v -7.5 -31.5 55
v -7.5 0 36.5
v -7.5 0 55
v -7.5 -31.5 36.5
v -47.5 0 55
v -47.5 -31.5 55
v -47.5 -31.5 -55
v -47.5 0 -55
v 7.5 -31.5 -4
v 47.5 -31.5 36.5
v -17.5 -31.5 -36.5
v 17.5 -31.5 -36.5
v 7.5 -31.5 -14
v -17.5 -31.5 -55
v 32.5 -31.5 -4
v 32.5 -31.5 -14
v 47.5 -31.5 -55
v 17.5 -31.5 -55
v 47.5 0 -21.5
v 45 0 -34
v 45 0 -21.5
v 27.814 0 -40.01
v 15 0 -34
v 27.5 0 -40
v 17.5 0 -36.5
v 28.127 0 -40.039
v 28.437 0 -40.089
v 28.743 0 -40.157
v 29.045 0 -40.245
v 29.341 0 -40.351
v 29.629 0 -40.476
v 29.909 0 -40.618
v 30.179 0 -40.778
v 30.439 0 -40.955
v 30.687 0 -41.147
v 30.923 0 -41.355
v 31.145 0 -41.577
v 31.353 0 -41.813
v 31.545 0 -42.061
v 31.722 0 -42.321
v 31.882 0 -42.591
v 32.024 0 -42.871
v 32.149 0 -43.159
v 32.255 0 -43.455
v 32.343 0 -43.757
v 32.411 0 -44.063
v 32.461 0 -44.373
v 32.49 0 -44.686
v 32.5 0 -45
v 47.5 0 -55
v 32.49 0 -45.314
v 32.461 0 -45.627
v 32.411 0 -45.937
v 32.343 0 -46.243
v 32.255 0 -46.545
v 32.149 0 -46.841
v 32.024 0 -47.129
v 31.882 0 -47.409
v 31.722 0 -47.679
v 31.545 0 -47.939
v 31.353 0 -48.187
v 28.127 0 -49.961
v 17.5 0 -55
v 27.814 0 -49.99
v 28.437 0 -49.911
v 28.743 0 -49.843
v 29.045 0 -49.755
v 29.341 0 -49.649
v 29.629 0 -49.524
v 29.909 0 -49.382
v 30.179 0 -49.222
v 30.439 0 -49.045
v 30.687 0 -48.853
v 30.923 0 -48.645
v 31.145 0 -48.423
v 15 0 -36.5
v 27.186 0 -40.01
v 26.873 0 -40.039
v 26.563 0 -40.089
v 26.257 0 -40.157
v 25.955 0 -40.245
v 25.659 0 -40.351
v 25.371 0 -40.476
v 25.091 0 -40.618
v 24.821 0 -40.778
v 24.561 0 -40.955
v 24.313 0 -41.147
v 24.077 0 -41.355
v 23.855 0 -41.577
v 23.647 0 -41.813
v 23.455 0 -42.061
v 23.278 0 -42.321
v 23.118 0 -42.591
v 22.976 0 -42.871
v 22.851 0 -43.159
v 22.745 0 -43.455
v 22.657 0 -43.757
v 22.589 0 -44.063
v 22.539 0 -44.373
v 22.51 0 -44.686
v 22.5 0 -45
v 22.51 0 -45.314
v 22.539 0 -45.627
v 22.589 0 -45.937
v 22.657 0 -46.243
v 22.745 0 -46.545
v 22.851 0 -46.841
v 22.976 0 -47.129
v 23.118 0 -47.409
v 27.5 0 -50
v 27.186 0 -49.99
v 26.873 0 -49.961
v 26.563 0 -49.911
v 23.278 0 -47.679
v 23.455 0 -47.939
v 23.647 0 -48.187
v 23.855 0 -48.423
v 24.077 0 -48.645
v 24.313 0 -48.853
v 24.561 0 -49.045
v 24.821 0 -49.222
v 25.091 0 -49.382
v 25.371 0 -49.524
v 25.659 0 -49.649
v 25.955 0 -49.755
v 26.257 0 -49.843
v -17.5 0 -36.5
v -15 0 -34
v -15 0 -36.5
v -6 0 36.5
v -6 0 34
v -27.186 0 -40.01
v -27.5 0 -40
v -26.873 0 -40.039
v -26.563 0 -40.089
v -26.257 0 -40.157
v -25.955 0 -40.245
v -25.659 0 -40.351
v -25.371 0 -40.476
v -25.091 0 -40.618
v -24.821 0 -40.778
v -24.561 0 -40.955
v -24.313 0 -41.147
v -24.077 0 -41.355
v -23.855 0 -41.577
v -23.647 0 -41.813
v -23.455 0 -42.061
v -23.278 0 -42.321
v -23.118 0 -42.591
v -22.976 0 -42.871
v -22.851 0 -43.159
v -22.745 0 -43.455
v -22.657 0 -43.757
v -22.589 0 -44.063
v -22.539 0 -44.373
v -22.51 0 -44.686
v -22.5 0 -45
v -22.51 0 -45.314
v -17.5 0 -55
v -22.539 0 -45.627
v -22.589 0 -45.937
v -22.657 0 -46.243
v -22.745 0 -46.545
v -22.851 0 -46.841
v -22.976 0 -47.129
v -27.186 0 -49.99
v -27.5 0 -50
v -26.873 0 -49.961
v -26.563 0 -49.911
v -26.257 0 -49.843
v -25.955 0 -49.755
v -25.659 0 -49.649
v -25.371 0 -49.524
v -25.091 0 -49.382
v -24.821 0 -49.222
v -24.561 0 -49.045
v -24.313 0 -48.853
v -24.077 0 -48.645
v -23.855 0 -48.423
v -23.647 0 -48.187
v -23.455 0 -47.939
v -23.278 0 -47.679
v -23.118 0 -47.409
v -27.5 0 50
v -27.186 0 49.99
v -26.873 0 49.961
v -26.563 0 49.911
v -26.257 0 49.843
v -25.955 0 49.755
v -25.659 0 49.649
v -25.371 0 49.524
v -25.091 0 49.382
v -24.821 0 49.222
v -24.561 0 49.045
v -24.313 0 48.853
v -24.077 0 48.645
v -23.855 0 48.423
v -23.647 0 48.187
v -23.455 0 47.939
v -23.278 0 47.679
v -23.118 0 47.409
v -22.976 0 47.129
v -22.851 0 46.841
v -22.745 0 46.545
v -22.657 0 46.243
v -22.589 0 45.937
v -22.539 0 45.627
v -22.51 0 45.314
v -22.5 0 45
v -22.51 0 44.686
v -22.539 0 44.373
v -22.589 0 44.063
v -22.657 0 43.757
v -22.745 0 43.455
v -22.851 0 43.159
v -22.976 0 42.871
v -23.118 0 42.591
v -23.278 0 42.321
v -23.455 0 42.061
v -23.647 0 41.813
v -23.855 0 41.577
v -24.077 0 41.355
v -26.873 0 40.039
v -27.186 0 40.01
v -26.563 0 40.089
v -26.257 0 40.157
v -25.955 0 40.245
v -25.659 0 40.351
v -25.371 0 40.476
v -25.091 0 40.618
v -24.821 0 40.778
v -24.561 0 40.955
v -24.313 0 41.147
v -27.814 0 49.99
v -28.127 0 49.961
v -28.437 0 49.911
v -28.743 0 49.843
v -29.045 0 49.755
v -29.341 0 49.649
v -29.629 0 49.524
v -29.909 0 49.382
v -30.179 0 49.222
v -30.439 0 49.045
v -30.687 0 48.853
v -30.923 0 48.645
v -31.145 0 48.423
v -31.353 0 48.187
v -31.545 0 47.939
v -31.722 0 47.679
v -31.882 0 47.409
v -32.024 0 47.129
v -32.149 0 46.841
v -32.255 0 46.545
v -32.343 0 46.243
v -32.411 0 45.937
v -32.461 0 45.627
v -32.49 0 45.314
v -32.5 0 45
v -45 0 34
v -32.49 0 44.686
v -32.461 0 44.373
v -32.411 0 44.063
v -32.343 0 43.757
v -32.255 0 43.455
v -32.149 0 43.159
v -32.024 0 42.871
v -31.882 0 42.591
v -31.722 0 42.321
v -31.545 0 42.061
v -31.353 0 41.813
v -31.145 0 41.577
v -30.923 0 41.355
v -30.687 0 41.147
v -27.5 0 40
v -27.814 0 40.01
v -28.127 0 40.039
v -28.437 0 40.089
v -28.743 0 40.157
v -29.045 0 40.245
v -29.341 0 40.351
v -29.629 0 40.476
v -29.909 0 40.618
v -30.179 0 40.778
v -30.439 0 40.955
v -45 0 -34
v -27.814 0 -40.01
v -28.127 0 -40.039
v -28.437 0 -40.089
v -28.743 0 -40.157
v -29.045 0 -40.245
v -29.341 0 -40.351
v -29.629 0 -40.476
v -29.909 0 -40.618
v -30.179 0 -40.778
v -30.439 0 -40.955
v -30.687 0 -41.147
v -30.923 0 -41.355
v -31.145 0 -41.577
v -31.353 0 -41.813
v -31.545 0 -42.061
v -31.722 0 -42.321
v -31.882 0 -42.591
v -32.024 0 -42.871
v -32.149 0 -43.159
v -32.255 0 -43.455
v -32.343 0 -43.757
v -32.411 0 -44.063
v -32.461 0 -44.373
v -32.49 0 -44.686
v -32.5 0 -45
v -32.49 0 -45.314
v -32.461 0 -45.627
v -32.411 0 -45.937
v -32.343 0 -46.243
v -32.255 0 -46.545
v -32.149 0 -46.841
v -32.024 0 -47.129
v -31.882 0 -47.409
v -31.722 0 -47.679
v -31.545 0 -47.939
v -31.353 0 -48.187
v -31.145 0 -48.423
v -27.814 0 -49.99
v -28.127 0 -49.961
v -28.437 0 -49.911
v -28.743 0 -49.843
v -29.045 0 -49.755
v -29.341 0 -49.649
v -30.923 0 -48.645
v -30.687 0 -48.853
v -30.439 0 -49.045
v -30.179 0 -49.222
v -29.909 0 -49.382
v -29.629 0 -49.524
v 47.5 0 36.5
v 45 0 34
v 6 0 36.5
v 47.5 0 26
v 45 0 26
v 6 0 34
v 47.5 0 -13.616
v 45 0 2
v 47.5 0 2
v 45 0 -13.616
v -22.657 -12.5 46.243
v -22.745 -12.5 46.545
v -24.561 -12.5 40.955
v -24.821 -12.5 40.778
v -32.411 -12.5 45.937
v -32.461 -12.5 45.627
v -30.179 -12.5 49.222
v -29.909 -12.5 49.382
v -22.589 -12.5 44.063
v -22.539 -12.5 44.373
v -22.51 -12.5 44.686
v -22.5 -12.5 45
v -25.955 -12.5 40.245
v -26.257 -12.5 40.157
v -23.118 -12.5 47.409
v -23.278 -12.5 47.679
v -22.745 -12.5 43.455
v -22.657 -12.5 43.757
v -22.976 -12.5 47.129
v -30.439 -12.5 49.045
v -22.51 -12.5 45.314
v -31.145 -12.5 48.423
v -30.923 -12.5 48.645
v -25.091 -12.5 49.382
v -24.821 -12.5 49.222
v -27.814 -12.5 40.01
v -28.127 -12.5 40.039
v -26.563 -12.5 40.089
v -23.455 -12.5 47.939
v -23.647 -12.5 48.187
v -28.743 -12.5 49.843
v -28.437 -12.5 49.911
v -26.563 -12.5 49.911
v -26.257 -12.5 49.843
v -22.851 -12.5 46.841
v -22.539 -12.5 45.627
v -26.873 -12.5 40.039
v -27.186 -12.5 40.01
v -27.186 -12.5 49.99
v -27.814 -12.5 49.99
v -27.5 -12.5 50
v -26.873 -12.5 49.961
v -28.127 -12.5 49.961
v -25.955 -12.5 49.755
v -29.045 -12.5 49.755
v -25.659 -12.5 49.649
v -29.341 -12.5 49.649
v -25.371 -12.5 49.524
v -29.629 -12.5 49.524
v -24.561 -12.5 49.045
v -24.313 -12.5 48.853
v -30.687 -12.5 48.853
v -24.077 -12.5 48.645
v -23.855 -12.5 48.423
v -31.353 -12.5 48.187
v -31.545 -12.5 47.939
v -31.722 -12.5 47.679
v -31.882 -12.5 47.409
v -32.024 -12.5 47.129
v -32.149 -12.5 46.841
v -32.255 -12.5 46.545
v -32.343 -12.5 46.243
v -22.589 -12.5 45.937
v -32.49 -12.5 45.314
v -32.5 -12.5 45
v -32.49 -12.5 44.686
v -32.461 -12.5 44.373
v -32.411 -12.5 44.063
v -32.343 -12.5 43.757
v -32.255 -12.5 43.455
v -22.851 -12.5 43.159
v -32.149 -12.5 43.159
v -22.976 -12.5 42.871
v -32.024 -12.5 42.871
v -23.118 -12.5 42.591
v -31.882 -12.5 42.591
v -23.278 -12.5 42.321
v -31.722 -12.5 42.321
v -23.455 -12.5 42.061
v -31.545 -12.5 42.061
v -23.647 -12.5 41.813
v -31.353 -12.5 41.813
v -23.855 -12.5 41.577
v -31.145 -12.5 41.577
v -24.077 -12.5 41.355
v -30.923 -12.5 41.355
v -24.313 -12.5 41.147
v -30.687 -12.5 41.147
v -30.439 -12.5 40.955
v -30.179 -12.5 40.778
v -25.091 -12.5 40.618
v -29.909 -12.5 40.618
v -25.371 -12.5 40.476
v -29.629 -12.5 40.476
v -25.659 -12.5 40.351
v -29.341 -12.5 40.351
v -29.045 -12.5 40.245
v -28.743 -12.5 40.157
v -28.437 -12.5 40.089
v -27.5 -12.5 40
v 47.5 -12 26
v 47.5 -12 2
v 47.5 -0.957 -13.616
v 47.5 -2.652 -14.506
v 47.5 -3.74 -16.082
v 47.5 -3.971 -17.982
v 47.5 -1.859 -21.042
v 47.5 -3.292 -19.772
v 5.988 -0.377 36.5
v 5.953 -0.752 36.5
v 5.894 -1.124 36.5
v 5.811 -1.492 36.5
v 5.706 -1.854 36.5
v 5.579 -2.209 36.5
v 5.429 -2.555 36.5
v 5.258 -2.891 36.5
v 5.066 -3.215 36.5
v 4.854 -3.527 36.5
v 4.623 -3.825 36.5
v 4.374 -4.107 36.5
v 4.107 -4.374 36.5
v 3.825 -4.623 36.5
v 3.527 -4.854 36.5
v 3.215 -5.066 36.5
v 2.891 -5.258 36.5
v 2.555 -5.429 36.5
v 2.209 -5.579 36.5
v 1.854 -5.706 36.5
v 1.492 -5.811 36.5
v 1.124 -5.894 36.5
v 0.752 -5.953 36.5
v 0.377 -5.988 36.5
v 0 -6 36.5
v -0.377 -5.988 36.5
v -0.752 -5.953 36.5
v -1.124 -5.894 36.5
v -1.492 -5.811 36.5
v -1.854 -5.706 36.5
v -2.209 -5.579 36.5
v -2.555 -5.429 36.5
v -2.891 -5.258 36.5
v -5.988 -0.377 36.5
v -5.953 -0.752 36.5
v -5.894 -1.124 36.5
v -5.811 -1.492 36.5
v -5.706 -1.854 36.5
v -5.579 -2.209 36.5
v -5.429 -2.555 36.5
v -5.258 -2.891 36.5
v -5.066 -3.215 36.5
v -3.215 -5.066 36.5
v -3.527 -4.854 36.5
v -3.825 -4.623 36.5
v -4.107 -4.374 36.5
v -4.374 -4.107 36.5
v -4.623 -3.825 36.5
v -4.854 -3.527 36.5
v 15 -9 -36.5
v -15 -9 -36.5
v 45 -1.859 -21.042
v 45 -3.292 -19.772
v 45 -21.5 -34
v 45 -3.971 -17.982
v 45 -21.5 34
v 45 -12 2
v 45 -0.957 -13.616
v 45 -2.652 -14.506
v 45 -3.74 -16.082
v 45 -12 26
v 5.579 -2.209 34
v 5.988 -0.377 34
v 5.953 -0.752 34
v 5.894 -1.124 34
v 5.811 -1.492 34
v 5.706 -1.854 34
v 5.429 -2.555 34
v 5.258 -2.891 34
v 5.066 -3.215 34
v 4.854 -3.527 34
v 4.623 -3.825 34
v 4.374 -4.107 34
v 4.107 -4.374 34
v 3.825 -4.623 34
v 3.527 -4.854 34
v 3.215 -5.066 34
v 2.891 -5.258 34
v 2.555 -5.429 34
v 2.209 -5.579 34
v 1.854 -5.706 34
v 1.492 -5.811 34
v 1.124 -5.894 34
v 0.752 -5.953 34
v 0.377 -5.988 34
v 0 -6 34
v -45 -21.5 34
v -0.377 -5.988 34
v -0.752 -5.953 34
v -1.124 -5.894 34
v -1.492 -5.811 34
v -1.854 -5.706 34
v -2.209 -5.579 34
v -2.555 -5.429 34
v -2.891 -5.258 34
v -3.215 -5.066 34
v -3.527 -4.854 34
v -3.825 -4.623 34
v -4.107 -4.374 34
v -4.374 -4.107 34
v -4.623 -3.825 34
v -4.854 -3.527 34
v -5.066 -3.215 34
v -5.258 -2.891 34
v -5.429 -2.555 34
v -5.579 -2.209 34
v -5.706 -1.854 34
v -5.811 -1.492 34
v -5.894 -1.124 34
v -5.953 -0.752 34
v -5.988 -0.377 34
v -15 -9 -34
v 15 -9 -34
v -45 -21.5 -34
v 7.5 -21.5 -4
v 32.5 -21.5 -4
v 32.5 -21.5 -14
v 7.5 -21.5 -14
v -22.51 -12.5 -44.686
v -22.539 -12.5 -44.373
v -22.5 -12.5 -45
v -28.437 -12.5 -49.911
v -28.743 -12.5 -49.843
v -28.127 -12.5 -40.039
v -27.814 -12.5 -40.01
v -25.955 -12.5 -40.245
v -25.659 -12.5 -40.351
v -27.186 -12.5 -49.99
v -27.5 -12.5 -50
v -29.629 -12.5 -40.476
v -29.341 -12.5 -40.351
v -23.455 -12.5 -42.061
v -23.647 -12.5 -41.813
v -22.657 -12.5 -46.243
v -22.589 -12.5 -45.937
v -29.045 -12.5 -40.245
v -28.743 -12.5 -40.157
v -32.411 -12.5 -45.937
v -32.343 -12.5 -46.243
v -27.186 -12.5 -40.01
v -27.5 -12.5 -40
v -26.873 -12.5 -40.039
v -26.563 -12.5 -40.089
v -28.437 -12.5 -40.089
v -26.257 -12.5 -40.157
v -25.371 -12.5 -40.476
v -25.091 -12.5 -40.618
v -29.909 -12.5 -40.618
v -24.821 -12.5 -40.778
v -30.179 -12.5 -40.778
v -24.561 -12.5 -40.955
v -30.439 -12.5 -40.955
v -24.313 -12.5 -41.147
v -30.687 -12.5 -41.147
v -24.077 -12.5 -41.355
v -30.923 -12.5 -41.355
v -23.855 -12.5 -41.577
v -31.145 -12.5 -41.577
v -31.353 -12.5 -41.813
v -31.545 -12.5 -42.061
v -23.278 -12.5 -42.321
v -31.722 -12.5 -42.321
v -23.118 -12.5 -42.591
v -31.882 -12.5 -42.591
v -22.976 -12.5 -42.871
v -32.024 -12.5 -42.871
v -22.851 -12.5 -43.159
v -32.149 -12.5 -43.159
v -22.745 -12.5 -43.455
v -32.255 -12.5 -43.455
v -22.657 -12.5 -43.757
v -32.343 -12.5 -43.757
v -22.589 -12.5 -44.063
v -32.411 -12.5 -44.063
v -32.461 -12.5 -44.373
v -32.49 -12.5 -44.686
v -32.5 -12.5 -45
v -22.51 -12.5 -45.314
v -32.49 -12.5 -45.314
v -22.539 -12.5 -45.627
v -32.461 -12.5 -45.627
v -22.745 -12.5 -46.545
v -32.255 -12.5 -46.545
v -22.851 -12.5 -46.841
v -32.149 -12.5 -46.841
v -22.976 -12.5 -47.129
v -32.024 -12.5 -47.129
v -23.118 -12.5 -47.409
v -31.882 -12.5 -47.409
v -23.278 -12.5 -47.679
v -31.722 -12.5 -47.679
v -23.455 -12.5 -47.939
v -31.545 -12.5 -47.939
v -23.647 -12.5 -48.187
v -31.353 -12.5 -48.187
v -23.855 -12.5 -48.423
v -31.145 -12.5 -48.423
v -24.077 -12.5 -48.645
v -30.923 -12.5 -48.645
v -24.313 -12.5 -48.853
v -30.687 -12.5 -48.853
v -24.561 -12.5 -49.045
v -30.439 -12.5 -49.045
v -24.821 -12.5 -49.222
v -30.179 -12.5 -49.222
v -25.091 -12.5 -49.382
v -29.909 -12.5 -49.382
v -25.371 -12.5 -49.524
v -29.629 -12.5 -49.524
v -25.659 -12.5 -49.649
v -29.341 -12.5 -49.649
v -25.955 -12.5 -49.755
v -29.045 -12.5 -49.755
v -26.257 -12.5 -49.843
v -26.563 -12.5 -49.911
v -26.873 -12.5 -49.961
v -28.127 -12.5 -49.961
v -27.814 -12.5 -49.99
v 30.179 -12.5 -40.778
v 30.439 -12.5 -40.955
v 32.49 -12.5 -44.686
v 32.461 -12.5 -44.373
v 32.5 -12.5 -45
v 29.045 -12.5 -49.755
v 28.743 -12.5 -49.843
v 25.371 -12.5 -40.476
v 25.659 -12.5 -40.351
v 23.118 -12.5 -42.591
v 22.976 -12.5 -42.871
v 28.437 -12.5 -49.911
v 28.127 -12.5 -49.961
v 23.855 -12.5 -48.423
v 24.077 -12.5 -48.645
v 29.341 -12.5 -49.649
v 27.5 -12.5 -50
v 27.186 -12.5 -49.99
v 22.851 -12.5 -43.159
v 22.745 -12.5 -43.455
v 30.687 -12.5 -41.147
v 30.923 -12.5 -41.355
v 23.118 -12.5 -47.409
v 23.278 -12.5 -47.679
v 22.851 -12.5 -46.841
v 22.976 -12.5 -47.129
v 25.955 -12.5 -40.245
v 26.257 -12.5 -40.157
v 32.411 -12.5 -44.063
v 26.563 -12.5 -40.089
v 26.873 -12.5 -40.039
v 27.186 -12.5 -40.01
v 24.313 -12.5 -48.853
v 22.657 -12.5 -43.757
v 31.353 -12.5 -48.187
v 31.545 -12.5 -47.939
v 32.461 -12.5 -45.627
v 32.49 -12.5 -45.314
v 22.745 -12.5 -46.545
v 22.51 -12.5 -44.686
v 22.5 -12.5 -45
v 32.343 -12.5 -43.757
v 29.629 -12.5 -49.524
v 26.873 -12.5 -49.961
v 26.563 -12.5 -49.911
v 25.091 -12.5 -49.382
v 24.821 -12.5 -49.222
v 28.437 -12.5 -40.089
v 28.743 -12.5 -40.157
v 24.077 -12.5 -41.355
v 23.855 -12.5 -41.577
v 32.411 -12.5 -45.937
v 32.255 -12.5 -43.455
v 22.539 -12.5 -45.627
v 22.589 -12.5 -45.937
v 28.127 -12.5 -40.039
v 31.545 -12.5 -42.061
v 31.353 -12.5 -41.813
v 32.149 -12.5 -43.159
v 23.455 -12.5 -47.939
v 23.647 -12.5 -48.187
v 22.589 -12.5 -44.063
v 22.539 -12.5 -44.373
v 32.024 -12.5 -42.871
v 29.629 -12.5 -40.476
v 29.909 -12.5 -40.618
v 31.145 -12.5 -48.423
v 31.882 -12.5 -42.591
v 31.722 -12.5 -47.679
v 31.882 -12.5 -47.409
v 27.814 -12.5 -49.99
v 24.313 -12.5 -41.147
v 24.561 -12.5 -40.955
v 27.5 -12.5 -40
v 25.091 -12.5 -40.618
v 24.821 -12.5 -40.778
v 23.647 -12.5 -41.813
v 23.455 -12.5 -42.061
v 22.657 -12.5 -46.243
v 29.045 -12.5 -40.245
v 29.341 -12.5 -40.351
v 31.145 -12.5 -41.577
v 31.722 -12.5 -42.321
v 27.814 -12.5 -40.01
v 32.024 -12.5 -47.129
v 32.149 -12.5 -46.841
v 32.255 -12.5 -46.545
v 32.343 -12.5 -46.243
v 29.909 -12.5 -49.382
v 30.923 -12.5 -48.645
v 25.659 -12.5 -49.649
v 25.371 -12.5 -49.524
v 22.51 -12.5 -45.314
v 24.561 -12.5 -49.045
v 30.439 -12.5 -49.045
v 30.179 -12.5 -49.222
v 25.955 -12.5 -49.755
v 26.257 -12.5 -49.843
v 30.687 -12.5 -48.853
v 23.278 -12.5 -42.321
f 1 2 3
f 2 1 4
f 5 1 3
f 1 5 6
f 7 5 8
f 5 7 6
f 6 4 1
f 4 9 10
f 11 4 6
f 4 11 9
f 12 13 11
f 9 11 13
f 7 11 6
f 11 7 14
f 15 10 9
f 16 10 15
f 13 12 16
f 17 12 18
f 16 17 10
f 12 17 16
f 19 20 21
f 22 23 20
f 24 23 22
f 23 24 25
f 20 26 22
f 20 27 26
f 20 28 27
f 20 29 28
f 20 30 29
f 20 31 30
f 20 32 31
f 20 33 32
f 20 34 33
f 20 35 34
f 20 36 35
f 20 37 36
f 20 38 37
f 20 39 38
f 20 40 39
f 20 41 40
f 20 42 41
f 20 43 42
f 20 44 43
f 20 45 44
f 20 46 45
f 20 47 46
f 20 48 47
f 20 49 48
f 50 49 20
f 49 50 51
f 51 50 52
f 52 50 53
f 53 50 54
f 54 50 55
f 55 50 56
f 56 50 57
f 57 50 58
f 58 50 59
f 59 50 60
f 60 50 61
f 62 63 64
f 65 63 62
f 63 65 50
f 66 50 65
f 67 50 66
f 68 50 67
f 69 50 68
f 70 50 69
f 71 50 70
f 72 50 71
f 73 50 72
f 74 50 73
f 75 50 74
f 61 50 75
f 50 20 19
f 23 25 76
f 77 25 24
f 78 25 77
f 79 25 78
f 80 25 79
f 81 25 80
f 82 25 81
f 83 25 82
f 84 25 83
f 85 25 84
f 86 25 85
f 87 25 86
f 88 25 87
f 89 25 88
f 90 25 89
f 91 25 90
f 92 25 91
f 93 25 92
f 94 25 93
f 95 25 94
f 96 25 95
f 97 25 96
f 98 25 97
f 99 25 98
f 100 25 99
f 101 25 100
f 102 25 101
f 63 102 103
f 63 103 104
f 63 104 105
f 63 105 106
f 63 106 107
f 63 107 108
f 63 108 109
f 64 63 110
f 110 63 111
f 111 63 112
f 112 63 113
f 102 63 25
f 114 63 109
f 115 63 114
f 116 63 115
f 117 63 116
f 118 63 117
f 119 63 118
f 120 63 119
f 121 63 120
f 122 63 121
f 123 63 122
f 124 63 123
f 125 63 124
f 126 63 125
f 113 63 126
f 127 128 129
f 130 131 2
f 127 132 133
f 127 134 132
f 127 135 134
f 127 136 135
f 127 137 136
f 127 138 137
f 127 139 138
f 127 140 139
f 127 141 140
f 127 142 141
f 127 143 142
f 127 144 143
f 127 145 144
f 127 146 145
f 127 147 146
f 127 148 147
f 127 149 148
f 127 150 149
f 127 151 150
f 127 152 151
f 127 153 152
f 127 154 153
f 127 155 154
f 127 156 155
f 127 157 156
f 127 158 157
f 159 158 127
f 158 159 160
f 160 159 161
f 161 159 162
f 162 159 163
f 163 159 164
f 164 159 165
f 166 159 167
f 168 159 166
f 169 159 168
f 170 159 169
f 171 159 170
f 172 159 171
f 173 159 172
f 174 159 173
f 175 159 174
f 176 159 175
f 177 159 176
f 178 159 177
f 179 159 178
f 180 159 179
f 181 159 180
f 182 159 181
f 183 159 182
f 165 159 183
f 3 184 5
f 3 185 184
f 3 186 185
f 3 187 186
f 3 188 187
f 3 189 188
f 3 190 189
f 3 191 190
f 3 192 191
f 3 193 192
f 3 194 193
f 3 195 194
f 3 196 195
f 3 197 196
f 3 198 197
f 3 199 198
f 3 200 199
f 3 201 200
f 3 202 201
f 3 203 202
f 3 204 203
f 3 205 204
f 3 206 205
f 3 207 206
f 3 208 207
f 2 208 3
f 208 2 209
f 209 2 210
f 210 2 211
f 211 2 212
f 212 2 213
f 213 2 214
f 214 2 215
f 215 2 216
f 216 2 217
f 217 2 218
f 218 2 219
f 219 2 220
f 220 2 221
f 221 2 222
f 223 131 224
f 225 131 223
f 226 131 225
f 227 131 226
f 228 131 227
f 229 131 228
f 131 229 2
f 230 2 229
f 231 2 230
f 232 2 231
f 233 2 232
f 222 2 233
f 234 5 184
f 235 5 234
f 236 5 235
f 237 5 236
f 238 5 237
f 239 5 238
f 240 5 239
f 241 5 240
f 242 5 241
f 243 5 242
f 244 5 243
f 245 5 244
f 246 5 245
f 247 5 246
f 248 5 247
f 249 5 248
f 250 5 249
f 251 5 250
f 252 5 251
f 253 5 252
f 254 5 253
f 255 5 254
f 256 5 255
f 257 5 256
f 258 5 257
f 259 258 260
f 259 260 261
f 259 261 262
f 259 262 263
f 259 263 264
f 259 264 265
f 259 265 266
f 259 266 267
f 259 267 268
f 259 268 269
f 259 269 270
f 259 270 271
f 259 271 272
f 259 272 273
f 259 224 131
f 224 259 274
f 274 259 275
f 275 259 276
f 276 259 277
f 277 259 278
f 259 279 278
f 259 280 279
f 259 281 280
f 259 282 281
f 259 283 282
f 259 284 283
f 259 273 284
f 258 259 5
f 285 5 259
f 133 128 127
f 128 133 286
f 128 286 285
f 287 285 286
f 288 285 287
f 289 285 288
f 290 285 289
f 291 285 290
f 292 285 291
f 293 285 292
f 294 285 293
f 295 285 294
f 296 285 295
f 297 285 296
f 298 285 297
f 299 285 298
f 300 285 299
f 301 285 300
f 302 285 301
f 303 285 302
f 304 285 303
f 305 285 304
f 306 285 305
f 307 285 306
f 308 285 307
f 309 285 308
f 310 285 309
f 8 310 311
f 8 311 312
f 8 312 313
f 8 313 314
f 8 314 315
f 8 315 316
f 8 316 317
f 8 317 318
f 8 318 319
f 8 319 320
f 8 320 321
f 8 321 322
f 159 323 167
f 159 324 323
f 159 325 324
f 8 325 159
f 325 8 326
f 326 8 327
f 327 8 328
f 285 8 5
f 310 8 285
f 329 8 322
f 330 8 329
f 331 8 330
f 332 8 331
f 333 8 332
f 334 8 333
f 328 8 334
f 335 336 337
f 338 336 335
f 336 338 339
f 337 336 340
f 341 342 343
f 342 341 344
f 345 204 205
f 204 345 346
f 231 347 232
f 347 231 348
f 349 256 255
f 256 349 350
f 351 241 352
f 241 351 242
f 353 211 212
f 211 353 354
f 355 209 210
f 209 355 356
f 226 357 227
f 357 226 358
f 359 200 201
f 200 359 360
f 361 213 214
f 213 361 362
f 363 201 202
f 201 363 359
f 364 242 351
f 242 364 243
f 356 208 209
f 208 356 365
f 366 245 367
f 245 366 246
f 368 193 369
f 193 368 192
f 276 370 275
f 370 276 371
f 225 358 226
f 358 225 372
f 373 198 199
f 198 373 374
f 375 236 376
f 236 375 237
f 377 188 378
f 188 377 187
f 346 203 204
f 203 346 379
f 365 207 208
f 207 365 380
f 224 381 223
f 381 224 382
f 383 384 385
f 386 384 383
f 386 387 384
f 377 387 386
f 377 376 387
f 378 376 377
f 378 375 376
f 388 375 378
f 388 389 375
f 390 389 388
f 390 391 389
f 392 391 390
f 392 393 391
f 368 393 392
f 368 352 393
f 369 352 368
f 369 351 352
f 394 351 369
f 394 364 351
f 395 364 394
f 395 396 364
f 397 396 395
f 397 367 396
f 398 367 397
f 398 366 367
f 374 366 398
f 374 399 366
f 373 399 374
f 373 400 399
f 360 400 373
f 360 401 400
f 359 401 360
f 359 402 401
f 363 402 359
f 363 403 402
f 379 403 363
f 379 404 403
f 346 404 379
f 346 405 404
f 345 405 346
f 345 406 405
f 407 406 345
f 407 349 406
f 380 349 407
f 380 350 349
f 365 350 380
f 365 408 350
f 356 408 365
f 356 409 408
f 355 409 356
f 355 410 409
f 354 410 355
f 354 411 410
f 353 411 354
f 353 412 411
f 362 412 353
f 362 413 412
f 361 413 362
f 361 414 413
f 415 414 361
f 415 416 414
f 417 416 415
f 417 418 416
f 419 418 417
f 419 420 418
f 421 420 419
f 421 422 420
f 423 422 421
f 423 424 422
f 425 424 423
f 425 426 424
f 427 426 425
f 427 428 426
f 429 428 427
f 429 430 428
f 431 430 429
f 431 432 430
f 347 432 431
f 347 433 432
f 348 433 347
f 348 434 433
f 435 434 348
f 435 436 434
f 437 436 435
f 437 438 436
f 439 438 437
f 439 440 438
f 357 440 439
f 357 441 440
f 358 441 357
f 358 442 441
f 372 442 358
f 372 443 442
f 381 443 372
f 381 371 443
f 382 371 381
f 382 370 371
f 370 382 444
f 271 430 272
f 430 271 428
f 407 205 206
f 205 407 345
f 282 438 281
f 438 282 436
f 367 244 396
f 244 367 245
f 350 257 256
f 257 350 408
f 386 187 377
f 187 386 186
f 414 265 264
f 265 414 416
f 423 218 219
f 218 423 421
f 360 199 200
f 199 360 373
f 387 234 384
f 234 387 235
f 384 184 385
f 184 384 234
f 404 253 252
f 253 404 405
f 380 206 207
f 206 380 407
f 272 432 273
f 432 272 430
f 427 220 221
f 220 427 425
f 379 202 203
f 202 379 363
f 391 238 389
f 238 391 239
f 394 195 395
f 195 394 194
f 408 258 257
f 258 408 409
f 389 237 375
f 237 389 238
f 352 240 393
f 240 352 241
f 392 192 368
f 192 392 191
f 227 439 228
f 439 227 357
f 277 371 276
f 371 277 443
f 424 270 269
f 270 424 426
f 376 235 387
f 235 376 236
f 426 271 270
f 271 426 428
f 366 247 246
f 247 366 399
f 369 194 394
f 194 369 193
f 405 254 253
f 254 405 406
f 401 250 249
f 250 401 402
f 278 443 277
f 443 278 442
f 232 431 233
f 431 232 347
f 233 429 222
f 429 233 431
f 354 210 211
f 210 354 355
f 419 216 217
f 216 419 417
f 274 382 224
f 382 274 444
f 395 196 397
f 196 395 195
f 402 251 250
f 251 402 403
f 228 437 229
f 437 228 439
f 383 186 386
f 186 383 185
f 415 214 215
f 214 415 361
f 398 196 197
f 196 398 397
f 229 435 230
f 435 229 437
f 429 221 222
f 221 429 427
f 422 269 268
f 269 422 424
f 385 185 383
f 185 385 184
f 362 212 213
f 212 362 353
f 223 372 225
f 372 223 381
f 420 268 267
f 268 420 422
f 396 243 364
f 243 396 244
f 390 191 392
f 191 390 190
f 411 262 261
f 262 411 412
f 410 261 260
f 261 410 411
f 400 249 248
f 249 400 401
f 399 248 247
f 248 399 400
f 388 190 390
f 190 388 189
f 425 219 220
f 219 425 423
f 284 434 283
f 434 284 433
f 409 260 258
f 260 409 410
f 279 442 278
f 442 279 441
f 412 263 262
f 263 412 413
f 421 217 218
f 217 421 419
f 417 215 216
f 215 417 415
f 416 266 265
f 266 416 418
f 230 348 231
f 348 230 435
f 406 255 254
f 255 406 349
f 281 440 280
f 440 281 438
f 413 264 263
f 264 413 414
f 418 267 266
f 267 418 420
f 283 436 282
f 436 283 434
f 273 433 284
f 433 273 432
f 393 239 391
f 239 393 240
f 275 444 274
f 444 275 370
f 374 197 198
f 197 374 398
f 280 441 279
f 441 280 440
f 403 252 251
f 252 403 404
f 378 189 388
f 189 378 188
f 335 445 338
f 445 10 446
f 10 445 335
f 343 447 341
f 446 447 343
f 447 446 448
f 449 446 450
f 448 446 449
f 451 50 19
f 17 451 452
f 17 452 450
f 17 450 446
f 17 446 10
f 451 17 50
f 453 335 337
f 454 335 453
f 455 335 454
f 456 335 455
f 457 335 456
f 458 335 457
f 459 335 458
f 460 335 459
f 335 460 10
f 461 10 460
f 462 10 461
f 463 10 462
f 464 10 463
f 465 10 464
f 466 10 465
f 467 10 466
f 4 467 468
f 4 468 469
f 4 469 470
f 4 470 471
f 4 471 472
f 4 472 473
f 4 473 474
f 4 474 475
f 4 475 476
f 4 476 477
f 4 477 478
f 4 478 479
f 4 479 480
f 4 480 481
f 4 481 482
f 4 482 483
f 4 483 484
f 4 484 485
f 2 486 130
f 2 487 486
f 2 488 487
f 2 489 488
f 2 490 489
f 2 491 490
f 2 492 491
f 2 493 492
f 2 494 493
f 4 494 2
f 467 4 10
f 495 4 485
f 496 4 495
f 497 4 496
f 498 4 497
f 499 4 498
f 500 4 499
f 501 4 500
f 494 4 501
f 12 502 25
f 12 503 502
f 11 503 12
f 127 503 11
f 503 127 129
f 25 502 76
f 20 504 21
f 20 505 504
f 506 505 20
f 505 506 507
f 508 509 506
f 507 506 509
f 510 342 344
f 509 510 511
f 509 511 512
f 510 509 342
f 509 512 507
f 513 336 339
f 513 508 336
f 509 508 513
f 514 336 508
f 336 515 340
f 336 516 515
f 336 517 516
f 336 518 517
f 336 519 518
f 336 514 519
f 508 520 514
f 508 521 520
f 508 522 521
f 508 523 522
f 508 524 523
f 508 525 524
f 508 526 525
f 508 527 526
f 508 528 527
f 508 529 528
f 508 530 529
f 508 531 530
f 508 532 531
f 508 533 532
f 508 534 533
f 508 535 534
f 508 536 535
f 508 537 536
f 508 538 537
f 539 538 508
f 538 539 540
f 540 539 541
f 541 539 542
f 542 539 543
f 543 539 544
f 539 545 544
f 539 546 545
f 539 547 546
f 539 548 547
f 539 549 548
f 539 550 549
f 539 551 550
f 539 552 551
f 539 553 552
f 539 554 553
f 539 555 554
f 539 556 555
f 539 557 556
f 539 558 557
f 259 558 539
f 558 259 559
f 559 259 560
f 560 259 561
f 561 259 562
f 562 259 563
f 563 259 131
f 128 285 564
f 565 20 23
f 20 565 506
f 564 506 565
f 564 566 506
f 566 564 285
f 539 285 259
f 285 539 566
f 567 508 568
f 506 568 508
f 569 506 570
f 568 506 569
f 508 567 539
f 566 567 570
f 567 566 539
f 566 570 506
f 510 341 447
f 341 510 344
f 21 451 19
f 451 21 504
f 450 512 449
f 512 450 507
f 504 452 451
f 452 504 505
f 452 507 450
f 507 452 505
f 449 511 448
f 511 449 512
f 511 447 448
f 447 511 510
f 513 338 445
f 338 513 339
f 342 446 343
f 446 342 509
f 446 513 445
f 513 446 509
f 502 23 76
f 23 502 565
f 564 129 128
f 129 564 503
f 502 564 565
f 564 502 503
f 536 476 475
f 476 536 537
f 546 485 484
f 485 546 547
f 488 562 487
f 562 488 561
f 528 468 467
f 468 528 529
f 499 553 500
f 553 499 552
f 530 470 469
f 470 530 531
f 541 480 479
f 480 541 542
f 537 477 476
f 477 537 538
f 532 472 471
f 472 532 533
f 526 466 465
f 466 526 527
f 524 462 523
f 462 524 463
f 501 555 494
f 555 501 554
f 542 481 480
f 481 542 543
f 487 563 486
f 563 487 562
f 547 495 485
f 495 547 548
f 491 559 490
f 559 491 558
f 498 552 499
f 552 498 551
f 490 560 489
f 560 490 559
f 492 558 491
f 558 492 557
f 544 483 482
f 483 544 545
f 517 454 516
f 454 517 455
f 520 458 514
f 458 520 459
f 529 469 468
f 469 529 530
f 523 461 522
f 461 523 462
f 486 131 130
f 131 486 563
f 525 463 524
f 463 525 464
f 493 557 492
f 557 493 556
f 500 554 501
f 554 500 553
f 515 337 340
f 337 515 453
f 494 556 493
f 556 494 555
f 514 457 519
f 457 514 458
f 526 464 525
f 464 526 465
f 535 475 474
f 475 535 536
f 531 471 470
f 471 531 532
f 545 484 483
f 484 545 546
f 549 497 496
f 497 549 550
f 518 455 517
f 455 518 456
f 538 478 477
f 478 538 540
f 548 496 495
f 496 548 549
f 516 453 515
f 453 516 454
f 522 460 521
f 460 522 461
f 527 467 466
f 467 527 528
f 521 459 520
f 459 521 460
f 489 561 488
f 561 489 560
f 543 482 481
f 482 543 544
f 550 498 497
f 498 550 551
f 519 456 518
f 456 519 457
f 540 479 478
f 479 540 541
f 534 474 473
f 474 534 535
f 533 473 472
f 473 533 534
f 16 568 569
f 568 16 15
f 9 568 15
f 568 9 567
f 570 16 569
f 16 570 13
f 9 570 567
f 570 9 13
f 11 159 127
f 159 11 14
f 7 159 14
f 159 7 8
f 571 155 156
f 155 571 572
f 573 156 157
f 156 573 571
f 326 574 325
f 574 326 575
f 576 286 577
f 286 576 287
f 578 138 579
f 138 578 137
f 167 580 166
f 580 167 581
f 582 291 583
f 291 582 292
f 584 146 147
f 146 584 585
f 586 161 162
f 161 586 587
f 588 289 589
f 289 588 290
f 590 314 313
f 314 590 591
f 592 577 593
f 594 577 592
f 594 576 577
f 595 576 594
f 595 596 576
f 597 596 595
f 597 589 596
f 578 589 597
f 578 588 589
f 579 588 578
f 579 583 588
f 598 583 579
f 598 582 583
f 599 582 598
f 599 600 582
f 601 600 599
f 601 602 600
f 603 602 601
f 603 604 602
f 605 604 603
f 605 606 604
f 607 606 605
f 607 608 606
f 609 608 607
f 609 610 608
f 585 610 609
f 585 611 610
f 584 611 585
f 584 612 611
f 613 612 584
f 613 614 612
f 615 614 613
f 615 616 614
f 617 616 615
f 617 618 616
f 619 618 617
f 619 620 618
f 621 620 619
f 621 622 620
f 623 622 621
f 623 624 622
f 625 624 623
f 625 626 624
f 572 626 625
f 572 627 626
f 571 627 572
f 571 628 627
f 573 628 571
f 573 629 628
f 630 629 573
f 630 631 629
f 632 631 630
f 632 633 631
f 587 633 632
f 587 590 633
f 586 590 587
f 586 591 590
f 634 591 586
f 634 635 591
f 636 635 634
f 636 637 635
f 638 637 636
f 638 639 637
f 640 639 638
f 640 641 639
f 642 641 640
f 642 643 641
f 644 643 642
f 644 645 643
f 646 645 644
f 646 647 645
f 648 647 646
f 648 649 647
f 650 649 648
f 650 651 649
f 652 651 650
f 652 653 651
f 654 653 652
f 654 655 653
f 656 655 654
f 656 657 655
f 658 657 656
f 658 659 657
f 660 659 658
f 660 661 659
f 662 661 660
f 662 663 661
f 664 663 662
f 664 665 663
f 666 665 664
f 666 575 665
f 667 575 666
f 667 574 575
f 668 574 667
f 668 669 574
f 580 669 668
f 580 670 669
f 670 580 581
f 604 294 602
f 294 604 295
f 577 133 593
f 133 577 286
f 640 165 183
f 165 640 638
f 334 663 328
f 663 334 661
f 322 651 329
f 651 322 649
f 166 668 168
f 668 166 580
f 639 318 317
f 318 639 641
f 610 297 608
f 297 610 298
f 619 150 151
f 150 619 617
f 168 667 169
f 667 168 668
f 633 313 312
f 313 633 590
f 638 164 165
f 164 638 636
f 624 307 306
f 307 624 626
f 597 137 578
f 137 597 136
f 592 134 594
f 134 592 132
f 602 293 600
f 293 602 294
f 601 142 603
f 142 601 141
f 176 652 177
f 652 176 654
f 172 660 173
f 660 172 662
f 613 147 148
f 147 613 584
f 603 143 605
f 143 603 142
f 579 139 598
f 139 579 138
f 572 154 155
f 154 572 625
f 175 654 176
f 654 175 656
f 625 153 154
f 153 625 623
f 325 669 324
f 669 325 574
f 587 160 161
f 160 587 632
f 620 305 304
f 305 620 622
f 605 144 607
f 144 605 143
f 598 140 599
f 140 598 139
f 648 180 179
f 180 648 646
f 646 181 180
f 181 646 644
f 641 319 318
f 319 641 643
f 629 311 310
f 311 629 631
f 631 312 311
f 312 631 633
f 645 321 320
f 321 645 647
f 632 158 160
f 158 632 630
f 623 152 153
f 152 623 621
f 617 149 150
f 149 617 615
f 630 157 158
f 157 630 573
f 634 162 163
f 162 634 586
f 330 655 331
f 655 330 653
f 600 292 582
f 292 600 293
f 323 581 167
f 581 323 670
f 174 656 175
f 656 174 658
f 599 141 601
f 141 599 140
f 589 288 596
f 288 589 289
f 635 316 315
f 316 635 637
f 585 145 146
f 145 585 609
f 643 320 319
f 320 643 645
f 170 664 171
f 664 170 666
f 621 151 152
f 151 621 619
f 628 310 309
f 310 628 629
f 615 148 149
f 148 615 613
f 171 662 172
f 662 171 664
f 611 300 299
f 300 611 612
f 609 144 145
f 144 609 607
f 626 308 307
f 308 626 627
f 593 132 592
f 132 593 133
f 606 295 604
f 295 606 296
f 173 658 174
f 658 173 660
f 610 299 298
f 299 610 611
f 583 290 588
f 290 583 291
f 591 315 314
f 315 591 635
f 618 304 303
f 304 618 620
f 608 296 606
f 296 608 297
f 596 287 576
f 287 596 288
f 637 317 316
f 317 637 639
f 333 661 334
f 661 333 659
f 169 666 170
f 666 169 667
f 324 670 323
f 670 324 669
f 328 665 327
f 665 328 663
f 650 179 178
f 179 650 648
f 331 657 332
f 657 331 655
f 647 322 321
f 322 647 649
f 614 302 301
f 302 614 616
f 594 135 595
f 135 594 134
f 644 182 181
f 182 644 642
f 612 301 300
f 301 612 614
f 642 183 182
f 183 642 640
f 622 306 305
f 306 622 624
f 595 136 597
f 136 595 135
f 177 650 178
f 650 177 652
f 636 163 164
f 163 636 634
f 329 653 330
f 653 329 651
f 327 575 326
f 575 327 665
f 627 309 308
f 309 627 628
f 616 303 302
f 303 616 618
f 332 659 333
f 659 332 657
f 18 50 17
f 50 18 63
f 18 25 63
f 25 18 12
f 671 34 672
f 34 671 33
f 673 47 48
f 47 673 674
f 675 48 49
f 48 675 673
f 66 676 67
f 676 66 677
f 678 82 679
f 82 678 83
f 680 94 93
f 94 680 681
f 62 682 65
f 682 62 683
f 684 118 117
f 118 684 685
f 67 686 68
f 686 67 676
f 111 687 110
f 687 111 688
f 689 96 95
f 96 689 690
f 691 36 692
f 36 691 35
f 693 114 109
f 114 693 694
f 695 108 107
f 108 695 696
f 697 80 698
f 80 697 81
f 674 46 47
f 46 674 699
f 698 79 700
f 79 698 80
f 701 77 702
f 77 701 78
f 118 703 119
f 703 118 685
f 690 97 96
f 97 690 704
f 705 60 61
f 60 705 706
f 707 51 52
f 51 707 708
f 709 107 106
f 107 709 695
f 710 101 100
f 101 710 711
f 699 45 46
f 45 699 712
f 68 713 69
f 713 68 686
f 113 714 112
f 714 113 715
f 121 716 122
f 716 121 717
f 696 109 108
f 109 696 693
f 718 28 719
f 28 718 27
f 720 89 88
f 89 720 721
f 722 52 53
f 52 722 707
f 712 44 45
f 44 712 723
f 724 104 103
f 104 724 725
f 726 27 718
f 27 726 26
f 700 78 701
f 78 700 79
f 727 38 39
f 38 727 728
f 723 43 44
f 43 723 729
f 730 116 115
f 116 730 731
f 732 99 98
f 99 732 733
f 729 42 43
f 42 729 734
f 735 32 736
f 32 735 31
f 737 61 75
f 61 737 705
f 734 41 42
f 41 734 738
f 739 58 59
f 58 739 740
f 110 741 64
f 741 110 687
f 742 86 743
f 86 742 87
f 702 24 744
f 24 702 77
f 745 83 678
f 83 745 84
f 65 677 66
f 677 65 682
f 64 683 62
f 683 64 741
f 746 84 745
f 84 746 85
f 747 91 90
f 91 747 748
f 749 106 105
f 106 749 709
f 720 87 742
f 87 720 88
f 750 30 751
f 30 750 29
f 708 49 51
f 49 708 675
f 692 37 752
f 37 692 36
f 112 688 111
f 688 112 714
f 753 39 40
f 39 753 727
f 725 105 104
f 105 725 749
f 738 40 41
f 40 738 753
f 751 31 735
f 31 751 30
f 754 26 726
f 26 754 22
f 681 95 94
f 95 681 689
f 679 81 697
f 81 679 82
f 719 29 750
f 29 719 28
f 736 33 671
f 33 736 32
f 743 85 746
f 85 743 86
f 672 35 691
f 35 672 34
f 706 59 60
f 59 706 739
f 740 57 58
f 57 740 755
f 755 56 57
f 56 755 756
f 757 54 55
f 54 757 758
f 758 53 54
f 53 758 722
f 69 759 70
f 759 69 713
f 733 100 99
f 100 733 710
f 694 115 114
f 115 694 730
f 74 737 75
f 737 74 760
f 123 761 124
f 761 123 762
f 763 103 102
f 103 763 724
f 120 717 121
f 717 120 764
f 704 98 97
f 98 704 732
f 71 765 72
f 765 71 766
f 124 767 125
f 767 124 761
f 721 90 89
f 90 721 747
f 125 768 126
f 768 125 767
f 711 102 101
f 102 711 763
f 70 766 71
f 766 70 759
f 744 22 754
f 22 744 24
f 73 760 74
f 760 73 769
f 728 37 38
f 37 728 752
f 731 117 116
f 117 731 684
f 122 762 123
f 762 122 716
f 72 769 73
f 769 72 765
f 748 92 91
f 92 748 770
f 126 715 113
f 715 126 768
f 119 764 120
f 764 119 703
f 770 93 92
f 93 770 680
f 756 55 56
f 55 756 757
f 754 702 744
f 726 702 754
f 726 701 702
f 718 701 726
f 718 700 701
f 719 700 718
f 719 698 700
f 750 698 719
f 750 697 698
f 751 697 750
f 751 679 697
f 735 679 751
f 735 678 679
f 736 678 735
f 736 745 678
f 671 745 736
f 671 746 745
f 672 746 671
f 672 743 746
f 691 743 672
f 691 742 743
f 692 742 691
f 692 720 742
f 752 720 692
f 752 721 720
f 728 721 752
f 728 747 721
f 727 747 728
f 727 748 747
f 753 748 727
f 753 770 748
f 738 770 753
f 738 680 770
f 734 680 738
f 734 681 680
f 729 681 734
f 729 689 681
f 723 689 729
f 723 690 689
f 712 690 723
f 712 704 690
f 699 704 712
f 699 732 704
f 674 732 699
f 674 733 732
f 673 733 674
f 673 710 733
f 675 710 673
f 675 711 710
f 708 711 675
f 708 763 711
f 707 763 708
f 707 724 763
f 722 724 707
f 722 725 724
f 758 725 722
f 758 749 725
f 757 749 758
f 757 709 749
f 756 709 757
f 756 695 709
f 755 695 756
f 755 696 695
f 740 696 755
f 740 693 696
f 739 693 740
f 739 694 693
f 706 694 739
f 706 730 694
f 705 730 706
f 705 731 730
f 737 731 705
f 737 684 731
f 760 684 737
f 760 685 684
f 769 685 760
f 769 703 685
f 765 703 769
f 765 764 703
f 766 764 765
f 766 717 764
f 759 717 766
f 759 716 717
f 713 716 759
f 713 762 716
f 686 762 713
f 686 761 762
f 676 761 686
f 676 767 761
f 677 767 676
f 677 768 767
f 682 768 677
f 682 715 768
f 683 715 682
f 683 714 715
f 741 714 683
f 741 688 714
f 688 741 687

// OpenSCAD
length = 90;
width = 43;
height = 68;

union(){
difference(){
    translate([-((length+20)/4),-(width+10)/4,(height)/2+11]) cube([(length-10)/2,(width+30)/2,20],center=true);
    translate([0,(width)/2,0]) cube([length+25,width,height+50],center = true);
    translate([-((length+20)/4),0,(height)/2+11]) rotate ([90,0,0]) cylinder (h = 25, r=5, center = true, $fn=100);
}

difference(){
    cube([length+5,width+20,height+5],center = true);
    cube([length,width,height],center = true);
    translate([0,0,-17.5]) rotate([0,90,0]) cylinder(h=height,r=4);
    translate([0,(width)/2,0]) cube([length+25,width,height+50],center = true,$fn=100);
    translate([45,0,14]) cube(24,center = true);
    translate([0,0,-20]) cube([30,18,height],center=true);
    translate([0,0,20]) rotate ([0,0,90]) cylinder (h = width+10, r=6, center = true,$fn=100);
    translate([20,-22,-9]) cube([25,20,10], center=true, $fn=100);
}
difference(){
    translate([-((length+40)/4),-(width+10)/4,-((height)/2+11)]) cube([(length-30)/2,(width+30)/2,20],center=true);
    translate([0,(width)/2,0]) cube([length+25,width,height+50],center = true);  
    translate([-((length+20)/4),0,-((height)/2+11)]) rotate ([90,0,0]) cylinder (h = 25, r=5, center = true, $fn=100);
}



difference(){
    translate([((length+40)/4),-(width+10)/4,-((height)/2+11)]) cube([(length-30)/2,(width+30)/2,20],center=true);
    translate([0,(width)/2,0]) cube([length+25,width,height+50],center = true);  
    translate([((length+20)/4),0,-((height)/2+11)]) rotate ([90,0,0]) cylinder (h = 25, r=5, center = true, $fn=100);
}

}
